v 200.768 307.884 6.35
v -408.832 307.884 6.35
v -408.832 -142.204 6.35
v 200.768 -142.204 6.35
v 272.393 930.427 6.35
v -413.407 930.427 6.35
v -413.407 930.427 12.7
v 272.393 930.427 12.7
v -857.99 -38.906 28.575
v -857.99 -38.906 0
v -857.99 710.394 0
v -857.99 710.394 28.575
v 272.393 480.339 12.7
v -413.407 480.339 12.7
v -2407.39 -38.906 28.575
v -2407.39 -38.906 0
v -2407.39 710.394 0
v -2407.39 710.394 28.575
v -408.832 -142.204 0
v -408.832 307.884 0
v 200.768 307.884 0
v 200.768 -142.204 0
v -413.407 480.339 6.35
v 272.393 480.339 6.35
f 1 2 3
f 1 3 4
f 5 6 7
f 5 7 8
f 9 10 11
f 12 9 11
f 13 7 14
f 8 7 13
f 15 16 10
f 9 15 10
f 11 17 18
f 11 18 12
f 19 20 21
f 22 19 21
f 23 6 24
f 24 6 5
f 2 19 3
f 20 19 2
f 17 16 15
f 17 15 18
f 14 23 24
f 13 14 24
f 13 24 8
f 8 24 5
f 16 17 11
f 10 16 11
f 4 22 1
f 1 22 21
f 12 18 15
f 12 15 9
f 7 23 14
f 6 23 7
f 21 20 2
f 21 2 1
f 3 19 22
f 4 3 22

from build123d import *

# Parameters (mm, degrees)
F0_W     = 1549.4
F0_H     = 749.3
F1_DEPTH = 28.575
F2_W     = 609.6
F2_H     = 450.088
F3_DEPTH = 6.35
F4_W     = 685.8
F4_H     = 450.088
F5_DEPTH = 6.35


with BuildPart() as f1:
    # F0 (on Top) → F1 (new body)
    with BuildSketch(Plane.XY):
        with Locations((-1632.690442, 335.744324)):
            Rectangle(F0_W, F0_H)
    extrude(amount=F1_DEPTH)


with BuildPart() as f3:
    # F2 (on Top) → F3 (new body)
    with BuildSketch(Plane.XY):
        with Locations((-104.03229, 82.840162)):
            Rectangle(F2_W, F2_H)
    extrude(amount=F3_DEPTH)


with BuildPart() as f5:
    # F4 (on face) → F5 (new body)
    with BuildSketch(Plane.XY.offset(6.35)):
        with Locations((-70.506952, 705.383408)):
            Rectangle(F4_W, F4_H)
    extrude(amount=F5_DEPTH)


solid = Compound([f1.part, f3.part, f5.part])
